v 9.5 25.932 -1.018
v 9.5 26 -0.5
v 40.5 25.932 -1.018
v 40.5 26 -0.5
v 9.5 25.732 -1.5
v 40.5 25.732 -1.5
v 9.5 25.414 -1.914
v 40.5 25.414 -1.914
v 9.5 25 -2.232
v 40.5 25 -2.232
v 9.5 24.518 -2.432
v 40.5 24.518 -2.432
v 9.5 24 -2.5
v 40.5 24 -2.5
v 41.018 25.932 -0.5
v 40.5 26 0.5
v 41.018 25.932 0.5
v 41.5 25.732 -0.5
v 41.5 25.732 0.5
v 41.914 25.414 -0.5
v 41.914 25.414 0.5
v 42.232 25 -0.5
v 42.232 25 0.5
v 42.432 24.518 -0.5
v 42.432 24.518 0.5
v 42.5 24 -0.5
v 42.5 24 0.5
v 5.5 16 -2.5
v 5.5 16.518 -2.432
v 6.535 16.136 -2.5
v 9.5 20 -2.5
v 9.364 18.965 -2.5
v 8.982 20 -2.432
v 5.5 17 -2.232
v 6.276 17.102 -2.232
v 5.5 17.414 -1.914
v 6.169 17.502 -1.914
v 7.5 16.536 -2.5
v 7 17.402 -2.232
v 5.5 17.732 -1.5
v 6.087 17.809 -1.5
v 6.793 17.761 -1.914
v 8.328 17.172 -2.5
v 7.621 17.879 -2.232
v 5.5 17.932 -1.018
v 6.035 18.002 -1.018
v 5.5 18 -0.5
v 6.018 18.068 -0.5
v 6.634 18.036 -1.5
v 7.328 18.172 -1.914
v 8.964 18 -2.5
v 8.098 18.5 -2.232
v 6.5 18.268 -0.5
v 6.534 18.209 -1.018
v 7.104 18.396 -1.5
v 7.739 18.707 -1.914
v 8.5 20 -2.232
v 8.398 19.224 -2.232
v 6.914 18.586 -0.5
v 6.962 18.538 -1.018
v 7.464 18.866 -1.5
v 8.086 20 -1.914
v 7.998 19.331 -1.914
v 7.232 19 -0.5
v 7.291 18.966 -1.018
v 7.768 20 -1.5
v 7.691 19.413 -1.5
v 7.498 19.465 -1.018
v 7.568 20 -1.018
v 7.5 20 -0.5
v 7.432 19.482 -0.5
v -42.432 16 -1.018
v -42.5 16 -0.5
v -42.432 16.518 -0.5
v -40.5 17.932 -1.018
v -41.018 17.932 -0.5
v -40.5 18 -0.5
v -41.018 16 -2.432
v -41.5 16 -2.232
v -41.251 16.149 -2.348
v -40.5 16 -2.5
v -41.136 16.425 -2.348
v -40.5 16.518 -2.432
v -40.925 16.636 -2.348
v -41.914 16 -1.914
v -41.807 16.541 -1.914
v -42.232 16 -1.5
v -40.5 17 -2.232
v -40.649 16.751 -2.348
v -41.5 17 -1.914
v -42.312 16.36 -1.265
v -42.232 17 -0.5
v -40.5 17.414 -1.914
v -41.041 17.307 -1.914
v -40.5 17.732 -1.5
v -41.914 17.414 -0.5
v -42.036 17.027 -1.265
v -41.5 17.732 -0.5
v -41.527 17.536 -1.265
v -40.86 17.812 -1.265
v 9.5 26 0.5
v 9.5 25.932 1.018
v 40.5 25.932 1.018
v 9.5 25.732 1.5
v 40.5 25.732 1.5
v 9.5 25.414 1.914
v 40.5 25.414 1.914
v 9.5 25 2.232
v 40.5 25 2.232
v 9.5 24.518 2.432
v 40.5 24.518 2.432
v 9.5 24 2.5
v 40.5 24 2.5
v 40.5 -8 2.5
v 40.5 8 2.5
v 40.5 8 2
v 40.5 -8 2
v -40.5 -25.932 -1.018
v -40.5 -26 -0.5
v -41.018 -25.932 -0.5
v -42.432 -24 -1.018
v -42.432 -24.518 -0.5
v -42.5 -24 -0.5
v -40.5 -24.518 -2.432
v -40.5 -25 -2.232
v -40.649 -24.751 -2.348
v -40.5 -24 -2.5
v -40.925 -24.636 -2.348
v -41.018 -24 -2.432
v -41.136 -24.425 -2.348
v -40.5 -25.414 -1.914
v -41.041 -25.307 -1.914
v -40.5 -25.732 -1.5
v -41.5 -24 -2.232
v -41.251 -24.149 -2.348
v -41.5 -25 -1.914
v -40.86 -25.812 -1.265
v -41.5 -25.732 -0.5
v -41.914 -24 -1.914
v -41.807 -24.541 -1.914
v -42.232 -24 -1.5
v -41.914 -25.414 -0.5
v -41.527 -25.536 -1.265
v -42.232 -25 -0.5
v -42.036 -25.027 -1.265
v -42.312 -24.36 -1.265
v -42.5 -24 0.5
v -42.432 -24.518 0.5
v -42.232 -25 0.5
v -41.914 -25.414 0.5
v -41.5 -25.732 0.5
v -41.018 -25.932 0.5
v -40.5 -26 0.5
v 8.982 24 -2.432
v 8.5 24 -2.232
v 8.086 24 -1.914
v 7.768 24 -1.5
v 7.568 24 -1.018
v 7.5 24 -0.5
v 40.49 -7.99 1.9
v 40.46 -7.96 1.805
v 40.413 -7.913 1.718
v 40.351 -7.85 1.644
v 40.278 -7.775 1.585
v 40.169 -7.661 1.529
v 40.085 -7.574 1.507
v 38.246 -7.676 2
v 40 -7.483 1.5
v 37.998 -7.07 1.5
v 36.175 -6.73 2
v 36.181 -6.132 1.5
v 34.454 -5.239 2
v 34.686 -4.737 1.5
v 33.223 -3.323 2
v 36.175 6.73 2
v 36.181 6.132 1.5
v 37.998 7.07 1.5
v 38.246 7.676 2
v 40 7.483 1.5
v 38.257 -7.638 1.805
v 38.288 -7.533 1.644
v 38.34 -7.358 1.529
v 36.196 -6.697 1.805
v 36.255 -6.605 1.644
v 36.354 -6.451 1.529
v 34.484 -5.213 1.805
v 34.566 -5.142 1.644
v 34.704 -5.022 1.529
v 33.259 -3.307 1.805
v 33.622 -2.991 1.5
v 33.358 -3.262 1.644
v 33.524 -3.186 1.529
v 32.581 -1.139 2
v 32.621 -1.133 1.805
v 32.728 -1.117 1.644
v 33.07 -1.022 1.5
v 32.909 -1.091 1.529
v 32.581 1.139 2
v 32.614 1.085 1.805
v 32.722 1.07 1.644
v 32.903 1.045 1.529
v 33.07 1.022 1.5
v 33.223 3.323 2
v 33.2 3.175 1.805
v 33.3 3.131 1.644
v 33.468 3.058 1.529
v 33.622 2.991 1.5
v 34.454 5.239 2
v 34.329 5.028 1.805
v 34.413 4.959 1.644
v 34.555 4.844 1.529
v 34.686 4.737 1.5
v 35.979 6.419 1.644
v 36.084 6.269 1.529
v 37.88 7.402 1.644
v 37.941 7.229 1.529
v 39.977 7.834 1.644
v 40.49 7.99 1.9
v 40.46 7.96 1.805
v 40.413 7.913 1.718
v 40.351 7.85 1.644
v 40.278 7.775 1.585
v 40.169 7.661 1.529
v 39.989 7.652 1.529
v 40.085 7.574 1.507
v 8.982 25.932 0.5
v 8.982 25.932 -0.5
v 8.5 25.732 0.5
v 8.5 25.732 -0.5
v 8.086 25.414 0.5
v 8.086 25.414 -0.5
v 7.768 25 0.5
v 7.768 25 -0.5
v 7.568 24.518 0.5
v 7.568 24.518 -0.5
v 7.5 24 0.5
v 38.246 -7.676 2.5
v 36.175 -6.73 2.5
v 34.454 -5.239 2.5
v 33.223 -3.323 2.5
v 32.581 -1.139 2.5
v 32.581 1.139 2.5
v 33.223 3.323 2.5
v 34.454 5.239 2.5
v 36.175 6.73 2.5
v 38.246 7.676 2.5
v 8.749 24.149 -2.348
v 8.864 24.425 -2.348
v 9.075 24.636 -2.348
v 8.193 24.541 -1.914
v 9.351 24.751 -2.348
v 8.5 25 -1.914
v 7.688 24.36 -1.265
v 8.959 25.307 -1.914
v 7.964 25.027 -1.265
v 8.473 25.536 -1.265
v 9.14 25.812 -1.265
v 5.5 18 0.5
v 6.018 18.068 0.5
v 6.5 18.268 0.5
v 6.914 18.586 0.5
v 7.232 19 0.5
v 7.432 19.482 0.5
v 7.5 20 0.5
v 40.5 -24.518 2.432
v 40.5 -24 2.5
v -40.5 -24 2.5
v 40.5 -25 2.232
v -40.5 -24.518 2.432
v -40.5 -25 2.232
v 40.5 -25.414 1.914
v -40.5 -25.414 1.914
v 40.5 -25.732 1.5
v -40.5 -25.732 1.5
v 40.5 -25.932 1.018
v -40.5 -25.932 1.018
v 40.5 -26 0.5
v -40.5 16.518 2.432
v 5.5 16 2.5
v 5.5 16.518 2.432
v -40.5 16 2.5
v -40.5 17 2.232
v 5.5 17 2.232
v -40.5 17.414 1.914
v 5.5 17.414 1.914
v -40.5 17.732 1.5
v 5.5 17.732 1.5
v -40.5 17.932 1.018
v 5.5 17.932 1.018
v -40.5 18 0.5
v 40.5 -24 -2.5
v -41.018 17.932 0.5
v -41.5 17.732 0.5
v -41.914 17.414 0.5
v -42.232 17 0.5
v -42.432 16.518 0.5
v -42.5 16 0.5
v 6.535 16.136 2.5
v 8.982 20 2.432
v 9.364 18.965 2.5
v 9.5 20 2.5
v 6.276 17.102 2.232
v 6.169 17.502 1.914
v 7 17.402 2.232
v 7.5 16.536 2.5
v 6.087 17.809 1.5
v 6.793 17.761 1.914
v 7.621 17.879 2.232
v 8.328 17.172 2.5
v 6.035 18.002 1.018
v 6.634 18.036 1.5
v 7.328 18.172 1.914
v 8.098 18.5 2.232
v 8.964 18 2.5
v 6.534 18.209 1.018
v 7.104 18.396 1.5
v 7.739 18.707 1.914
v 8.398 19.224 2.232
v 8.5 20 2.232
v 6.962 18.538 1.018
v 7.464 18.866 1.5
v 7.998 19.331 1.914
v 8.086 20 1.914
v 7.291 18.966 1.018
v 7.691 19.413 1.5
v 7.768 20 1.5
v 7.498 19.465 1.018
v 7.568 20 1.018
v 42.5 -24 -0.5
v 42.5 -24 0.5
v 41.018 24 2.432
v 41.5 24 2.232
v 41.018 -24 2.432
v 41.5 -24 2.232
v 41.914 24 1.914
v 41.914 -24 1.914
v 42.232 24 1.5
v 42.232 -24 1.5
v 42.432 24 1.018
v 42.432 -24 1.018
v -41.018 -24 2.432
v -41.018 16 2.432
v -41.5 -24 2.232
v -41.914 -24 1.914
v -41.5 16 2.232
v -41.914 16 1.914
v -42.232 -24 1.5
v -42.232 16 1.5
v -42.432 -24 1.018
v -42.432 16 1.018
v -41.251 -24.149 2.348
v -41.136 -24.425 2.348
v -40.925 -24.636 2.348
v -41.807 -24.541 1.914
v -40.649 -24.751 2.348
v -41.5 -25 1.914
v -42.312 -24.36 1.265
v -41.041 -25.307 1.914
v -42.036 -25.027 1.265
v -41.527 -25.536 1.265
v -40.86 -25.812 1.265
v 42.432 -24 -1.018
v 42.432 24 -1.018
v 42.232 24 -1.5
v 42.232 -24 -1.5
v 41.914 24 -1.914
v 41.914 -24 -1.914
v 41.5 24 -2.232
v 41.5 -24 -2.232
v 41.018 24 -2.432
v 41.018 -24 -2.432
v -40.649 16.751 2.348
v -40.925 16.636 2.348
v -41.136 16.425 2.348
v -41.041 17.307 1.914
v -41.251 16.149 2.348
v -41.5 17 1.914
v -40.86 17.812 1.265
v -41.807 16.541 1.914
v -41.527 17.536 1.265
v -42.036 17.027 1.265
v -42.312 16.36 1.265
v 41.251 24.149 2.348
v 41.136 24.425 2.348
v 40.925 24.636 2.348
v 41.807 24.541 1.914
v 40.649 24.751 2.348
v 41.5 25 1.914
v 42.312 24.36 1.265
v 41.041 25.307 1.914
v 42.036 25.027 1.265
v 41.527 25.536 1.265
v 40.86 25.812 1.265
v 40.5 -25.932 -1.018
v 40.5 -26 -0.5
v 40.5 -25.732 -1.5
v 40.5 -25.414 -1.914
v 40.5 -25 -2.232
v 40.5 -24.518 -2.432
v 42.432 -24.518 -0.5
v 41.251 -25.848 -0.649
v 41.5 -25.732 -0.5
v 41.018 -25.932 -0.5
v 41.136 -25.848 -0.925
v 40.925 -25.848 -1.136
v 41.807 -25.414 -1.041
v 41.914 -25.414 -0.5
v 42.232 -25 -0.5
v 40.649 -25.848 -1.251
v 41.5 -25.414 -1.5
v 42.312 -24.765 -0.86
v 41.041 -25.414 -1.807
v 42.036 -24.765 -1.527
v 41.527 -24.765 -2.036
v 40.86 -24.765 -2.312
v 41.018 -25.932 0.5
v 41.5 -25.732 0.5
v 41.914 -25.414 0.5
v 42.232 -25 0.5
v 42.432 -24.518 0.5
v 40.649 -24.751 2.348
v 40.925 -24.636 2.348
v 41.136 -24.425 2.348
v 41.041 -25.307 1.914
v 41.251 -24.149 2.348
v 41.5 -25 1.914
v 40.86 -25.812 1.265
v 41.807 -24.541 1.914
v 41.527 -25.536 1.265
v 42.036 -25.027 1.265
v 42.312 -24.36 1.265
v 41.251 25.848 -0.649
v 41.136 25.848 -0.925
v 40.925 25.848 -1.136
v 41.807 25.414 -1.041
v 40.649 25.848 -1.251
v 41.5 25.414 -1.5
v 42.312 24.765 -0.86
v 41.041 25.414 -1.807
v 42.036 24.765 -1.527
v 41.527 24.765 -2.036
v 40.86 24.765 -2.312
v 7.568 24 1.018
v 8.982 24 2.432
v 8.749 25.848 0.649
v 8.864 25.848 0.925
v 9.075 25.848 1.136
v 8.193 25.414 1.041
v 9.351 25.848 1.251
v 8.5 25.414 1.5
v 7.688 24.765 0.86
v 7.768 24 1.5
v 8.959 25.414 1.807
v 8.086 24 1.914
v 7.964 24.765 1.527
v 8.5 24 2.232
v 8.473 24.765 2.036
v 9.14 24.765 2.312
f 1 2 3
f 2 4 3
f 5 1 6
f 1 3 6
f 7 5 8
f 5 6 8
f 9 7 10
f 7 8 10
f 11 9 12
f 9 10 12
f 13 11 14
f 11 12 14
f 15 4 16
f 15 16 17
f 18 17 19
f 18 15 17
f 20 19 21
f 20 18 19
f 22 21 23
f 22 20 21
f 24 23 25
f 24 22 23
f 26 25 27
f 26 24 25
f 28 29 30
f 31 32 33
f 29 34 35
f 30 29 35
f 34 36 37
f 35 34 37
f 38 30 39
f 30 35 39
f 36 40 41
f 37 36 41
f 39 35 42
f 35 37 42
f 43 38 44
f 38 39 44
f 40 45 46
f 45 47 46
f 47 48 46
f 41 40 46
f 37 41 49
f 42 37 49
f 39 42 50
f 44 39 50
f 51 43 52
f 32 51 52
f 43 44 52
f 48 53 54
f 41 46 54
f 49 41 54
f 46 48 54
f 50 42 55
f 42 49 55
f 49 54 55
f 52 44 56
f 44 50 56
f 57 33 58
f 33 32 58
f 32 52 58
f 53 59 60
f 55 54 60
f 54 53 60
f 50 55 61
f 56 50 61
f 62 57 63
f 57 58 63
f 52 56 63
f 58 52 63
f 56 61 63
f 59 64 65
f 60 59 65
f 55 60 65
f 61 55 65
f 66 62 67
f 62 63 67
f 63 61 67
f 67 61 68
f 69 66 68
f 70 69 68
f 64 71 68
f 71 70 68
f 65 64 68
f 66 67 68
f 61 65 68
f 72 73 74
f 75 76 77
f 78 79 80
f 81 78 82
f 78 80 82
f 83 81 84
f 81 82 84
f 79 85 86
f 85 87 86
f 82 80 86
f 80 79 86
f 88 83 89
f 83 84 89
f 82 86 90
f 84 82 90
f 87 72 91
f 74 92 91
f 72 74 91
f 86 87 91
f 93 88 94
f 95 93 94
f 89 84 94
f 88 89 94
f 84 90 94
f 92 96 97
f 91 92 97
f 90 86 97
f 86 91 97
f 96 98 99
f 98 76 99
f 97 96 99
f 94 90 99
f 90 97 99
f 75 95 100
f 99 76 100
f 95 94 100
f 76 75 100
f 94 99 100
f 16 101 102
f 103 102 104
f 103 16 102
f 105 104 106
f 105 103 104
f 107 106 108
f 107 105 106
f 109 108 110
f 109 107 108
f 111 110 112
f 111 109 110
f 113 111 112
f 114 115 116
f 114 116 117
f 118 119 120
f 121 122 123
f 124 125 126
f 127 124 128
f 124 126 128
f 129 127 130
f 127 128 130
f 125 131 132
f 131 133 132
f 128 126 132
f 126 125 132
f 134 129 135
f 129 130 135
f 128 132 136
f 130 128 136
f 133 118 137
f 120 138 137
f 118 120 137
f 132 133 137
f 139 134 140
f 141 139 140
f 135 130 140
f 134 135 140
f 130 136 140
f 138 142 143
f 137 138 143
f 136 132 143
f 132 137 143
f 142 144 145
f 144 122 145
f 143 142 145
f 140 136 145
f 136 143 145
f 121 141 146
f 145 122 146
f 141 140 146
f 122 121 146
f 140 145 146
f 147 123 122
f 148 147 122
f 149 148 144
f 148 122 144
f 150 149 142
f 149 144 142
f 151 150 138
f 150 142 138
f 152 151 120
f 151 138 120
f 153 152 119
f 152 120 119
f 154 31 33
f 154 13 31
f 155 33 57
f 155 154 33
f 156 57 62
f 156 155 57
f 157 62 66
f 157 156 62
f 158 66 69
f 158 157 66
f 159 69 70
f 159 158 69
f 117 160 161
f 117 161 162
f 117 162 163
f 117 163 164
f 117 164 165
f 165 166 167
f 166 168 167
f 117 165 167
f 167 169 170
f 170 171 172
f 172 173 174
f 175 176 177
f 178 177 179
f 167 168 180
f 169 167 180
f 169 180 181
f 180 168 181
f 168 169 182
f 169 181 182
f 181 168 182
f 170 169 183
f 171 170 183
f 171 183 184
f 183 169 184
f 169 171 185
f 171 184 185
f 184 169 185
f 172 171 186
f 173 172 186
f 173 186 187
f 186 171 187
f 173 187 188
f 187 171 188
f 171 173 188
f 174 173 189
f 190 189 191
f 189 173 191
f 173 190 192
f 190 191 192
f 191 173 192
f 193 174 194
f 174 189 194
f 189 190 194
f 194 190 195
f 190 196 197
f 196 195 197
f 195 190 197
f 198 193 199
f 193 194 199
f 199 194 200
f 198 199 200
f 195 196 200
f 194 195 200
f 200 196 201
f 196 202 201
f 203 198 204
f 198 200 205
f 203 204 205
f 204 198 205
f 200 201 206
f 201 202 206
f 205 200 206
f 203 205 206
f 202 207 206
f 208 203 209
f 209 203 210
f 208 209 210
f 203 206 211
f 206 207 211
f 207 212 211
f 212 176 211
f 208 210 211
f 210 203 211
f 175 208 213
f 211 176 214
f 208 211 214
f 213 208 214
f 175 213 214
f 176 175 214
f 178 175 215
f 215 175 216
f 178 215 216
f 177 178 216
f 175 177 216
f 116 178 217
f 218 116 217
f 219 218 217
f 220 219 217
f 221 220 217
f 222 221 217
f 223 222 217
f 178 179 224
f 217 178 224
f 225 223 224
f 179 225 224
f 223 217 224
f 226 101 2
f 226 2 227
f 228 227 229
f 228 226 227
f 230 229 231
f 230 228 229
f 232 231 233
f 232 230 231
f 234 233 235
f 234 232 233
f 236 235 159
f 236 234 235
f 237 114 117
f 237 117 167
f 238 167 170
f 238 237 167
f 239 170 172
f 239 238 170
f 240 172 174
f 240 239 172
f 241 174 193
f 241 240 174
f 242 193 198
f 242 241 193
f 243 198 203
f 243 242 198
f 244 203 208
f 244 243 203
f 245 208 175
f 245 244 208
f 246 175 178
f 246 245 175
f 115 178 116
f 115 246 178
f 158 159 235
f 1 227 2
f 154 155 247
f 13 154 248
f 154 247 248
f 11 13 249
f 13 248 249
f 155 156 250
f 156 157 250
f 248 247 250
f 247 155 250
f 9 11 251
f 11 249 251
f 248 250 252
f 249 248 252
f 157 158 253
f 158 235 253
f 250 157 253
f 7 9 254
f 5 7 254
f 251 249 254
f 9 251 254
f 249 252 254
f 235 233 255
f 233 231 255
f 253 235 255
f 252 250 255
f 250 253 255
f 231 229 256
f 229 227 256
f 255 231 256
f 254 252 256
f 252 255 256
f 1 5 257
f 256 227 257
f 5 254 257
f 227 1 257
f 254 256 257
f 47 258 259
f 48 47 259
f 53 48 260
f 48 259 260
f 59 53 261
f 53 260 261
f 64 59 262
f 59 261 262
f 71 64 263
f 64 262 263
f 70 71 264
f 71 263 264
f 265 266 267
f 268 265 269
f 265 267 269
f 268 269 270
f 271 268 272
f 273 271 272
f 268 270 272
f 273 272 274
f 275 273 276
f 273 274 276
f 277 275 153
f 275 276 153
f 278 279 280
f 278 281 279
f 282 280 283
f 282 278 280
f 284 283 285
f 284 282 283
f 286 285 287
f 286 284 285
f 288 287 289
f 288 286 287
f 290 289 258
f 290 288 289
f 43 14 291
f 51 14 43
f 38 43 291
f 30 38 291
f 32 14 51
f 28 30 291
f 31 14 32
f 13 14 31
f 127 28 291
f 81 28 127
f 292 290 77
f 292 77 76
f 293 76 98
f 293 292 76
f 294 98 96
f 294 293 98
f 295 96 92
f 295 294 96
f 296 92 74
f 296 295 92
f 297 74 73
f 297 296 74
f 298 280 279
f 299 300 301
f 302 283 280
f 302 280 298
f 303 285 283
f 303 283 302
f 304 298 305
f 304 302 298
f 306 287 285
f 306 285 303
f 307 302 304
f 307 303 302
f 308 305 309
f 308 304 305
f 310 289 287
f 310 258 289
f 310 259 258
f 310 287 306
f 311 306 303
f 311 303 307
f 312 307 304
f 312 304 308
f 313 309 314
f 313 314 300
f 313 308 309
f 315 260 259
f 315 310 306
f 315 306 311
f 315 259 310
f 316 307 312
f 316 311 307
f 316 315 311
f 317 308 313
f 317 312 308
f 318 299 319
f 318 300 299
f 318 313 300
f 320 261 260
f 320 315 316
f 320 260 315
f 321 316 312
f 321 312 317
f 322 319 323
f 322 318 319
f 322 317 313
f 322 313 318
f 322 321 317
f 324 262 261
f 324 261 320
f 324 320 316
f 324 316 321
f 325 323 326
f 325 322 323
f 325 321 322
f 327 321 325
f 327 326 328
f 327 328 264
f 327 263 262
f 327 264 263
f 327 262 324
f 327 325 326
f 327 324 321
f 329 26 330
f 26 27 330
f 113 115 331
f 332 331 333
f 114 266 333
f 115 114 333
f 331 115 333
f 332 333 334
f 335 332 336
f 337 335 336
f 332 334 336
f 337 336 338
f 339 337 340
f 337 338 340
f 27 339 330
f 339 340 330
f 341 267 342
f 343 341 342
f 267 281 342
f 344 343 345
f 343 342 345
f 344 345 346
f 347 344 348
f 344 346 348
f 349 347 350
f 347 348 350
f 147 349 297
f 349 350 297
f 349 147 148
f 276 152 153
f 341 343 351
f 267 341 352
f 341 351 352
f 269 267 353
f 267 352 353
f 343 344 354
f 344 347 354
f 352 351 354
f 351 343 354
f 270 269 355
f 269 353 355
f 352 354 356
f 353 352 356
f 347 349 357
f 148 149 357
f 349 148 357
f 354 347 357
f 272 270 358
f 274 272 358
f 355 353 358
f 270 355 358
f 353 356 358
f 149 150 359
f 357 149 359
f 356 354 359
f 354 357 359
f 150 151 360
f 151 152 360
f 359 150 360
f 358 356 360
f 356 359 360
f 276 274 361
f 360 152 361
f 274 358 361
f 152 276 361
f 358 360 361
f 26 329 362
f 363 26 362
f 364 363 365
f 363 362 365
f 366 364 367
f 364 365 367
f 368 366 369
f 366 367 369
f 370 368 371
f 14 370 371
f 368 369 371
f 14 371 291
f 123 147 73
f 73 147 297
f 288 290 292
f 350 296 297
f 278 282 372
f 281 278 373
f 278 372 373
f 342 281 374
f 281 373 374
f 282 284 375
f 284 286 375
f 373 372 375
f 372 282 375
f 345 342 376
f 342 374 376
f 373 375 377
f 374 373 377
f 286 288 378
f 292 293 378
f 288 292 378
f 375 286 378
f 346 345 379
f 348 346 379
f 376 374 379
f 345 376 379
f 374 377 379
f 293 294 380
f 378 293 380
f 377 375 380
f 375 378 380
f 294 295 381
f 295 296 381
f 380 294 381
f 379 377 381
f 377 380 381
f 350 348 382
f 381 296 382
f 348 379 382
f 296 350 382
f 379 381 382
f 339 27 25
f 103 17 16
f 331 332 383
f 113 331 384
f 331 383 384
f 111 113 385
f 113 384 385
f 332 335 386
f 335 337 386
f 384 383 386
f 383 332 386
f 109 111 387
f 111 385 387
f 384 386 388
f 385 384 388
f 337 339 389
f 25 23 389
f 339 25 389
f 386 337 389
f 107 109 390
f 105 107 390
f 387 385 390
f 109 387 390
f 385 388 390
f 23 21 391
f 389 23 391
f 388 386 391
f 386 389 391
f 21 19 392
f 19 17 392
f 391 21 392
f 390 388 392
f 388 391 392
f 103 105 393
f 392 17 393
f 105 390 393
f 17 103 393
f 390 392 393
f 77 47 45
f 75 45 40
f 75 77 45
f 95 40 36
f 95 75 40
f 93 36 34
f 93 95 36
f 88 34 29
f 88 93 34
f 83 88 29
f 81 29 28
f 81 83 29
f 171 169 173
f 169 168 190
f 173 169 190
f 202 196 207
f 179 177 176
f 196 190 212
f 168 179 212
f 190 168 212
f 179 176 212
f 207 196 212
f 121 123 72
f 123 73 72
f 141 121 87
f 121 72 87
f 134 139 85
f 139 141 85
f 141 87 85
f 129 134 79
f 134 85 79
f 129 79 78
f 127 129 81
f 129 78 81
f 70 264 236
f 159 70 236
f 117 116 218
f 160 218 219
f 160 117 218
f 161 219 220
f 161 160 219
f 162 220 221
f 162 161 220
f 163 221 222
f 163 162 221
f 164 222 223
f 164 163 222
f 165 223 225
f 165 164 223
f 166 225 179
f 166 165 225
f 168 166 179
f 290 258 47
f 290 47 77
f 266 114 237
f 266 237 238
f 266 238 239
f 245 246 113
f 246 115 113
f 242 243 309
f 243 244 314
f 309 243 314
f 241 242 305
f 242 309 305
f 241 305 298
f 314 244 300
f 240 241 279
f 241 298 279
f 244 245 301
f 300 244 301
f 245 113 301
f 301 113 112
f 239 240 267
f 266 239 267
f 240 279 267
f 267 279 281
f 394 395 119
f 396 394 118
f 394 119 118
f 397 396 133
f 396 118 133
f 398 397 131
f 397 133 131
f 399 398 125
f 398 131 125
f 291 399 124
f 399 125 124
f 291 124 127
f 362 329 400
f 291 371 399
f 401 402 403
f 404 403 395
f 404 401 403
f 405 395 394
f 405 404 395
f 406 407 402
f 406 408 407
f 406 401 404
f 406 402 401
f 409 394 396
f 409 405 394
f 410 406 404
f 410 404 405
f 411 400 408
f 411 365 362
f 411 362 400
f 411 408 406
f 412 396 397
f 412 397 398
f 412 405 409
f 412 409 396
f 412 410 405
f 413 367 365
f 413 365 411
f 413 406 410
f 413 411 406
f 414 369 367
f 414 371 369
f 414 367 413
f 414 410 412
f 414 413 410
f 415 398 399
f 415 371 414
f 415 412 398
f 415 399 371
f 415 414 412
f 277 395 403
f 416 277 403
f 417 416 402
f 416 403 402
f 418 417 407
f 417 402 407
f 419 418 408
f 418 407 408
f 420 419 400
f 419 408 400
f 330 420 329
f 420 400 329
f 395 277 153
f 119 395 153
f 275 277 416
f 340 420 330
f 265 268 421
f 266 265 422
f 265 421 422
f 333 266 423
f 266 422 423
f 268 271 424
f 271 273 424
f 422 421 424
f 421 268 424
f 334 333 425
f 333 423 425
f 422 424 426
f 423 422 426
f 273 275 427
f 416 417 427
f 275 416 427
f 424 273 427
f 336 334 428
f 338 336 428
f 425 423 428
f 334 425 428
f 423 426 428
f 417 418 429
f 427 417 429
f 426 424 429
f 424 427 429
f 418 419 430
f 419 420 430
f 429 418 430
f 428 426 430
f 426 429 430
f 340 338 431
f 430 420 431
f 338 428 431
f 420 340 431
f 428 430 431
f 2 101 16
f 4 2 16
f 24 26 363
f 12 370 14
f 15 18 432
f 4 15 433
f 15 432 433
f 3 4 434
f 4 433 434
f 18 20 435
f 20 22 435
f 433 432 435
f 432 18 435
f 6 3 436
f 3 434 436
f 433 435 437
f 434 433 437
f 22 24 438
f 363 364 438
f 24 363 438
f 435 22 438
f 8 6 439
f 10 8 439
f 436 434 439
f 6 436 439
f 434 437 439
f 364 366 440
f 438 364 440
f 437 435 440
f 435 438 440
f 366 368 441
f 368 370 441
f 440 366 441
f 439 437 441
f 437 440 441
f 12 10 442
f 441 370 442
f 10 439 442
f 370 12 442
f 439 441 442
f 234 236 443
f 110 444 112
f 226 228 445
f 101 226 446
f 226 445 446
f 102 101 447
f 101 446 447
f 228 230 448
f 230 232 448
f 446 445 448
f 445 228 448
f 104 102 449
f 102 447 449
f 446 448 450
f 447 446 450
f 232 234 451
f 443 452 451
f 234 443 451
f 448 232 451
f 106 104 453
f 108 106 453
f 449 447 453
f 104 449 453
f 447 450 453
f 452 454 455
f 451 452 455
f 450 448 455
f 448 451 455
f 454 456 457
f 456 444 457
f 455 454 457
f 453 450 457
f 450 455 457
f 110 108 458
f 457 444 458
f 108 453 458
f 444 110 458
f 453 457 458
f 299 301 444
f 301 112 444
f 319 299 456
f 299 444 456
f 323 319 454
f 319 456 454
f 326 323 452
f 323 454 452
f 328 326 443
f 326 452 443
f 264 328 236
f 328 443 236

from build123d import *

# Parameters (mm, degrees)
SALIENTE_EXTRUIR1_DEPTH = 2.5
REDONDEO1_R             = 2
CORTAR_EXTRUIR1_DEPTH   = 1
REDONDEO2_R             = 0.5


with BuildPart() as part:
    # Croquis1 → Saliente-Extruir1 (new body, symmetric)
    with BuildSketch(Plane.XY):
        Polygon((7.5, 26), (42.5, 26), (42.5, -26), (-42.5, -26), (-42.5, 18), (-7.5, 18), (7.5, 18), align=None)
    extrude(amount=SALIENTE_EXTRUIR1_DEPTH, both=True)

    # Redondeo1
    redondeo1_edges = [part.edges().sort_by_distance(p)[0] for p in [
        (42.5, 0, -2.5),
        (42.5, -26, 0),
        (-42.5, -26, 0),
        (-42.5, 18, 0),
        (7.5, 22, 2.5),
        (7.5, 18, 0),
        (7.5, 26, 0),
        (42.5, 26, 0),
        (-17.5, 18, 2.5),
        (-42.5, -4, 2.5),
        (0, -26, 2.5),
        (42.5, 0, 2.5),
        (0, -26, -2.5),
        (-42.5, -4, -2.5),
        (-17.5, 18, -2.5),
        (25, 26, 2.5),
        (7.5, 22, -2.5),
        (25, 26, -2.5),
    ]]
    fillet(redondeo1_edges, radius=REDONDEO1_R)

    # Croquis2 → Cortar-Extruir1 (cut)
    with BuildSketch(Plane.XY.offset(2.5)):
        with BuildLine():
            Line((40.5, 8), (40.5, -8))
            ThreePointArc((40.5, -8), (32.5, 0), (40.5, 8))
        make_face()
    extrude(amount=-CORTAR_EXTRUIR1_DEPTH, mode=Mode.SUBTRACT)

    # Redondeo2
    redondeo2_edges = [part.edges().sort_by_distance(p)[0] for p in [
        (32.5, 0, 1.5),
        (40.5, 0, 1.5),
    ]]
    fillet(redondeo2_edges, radius=REDONDEO2_R)


solid = part.part
